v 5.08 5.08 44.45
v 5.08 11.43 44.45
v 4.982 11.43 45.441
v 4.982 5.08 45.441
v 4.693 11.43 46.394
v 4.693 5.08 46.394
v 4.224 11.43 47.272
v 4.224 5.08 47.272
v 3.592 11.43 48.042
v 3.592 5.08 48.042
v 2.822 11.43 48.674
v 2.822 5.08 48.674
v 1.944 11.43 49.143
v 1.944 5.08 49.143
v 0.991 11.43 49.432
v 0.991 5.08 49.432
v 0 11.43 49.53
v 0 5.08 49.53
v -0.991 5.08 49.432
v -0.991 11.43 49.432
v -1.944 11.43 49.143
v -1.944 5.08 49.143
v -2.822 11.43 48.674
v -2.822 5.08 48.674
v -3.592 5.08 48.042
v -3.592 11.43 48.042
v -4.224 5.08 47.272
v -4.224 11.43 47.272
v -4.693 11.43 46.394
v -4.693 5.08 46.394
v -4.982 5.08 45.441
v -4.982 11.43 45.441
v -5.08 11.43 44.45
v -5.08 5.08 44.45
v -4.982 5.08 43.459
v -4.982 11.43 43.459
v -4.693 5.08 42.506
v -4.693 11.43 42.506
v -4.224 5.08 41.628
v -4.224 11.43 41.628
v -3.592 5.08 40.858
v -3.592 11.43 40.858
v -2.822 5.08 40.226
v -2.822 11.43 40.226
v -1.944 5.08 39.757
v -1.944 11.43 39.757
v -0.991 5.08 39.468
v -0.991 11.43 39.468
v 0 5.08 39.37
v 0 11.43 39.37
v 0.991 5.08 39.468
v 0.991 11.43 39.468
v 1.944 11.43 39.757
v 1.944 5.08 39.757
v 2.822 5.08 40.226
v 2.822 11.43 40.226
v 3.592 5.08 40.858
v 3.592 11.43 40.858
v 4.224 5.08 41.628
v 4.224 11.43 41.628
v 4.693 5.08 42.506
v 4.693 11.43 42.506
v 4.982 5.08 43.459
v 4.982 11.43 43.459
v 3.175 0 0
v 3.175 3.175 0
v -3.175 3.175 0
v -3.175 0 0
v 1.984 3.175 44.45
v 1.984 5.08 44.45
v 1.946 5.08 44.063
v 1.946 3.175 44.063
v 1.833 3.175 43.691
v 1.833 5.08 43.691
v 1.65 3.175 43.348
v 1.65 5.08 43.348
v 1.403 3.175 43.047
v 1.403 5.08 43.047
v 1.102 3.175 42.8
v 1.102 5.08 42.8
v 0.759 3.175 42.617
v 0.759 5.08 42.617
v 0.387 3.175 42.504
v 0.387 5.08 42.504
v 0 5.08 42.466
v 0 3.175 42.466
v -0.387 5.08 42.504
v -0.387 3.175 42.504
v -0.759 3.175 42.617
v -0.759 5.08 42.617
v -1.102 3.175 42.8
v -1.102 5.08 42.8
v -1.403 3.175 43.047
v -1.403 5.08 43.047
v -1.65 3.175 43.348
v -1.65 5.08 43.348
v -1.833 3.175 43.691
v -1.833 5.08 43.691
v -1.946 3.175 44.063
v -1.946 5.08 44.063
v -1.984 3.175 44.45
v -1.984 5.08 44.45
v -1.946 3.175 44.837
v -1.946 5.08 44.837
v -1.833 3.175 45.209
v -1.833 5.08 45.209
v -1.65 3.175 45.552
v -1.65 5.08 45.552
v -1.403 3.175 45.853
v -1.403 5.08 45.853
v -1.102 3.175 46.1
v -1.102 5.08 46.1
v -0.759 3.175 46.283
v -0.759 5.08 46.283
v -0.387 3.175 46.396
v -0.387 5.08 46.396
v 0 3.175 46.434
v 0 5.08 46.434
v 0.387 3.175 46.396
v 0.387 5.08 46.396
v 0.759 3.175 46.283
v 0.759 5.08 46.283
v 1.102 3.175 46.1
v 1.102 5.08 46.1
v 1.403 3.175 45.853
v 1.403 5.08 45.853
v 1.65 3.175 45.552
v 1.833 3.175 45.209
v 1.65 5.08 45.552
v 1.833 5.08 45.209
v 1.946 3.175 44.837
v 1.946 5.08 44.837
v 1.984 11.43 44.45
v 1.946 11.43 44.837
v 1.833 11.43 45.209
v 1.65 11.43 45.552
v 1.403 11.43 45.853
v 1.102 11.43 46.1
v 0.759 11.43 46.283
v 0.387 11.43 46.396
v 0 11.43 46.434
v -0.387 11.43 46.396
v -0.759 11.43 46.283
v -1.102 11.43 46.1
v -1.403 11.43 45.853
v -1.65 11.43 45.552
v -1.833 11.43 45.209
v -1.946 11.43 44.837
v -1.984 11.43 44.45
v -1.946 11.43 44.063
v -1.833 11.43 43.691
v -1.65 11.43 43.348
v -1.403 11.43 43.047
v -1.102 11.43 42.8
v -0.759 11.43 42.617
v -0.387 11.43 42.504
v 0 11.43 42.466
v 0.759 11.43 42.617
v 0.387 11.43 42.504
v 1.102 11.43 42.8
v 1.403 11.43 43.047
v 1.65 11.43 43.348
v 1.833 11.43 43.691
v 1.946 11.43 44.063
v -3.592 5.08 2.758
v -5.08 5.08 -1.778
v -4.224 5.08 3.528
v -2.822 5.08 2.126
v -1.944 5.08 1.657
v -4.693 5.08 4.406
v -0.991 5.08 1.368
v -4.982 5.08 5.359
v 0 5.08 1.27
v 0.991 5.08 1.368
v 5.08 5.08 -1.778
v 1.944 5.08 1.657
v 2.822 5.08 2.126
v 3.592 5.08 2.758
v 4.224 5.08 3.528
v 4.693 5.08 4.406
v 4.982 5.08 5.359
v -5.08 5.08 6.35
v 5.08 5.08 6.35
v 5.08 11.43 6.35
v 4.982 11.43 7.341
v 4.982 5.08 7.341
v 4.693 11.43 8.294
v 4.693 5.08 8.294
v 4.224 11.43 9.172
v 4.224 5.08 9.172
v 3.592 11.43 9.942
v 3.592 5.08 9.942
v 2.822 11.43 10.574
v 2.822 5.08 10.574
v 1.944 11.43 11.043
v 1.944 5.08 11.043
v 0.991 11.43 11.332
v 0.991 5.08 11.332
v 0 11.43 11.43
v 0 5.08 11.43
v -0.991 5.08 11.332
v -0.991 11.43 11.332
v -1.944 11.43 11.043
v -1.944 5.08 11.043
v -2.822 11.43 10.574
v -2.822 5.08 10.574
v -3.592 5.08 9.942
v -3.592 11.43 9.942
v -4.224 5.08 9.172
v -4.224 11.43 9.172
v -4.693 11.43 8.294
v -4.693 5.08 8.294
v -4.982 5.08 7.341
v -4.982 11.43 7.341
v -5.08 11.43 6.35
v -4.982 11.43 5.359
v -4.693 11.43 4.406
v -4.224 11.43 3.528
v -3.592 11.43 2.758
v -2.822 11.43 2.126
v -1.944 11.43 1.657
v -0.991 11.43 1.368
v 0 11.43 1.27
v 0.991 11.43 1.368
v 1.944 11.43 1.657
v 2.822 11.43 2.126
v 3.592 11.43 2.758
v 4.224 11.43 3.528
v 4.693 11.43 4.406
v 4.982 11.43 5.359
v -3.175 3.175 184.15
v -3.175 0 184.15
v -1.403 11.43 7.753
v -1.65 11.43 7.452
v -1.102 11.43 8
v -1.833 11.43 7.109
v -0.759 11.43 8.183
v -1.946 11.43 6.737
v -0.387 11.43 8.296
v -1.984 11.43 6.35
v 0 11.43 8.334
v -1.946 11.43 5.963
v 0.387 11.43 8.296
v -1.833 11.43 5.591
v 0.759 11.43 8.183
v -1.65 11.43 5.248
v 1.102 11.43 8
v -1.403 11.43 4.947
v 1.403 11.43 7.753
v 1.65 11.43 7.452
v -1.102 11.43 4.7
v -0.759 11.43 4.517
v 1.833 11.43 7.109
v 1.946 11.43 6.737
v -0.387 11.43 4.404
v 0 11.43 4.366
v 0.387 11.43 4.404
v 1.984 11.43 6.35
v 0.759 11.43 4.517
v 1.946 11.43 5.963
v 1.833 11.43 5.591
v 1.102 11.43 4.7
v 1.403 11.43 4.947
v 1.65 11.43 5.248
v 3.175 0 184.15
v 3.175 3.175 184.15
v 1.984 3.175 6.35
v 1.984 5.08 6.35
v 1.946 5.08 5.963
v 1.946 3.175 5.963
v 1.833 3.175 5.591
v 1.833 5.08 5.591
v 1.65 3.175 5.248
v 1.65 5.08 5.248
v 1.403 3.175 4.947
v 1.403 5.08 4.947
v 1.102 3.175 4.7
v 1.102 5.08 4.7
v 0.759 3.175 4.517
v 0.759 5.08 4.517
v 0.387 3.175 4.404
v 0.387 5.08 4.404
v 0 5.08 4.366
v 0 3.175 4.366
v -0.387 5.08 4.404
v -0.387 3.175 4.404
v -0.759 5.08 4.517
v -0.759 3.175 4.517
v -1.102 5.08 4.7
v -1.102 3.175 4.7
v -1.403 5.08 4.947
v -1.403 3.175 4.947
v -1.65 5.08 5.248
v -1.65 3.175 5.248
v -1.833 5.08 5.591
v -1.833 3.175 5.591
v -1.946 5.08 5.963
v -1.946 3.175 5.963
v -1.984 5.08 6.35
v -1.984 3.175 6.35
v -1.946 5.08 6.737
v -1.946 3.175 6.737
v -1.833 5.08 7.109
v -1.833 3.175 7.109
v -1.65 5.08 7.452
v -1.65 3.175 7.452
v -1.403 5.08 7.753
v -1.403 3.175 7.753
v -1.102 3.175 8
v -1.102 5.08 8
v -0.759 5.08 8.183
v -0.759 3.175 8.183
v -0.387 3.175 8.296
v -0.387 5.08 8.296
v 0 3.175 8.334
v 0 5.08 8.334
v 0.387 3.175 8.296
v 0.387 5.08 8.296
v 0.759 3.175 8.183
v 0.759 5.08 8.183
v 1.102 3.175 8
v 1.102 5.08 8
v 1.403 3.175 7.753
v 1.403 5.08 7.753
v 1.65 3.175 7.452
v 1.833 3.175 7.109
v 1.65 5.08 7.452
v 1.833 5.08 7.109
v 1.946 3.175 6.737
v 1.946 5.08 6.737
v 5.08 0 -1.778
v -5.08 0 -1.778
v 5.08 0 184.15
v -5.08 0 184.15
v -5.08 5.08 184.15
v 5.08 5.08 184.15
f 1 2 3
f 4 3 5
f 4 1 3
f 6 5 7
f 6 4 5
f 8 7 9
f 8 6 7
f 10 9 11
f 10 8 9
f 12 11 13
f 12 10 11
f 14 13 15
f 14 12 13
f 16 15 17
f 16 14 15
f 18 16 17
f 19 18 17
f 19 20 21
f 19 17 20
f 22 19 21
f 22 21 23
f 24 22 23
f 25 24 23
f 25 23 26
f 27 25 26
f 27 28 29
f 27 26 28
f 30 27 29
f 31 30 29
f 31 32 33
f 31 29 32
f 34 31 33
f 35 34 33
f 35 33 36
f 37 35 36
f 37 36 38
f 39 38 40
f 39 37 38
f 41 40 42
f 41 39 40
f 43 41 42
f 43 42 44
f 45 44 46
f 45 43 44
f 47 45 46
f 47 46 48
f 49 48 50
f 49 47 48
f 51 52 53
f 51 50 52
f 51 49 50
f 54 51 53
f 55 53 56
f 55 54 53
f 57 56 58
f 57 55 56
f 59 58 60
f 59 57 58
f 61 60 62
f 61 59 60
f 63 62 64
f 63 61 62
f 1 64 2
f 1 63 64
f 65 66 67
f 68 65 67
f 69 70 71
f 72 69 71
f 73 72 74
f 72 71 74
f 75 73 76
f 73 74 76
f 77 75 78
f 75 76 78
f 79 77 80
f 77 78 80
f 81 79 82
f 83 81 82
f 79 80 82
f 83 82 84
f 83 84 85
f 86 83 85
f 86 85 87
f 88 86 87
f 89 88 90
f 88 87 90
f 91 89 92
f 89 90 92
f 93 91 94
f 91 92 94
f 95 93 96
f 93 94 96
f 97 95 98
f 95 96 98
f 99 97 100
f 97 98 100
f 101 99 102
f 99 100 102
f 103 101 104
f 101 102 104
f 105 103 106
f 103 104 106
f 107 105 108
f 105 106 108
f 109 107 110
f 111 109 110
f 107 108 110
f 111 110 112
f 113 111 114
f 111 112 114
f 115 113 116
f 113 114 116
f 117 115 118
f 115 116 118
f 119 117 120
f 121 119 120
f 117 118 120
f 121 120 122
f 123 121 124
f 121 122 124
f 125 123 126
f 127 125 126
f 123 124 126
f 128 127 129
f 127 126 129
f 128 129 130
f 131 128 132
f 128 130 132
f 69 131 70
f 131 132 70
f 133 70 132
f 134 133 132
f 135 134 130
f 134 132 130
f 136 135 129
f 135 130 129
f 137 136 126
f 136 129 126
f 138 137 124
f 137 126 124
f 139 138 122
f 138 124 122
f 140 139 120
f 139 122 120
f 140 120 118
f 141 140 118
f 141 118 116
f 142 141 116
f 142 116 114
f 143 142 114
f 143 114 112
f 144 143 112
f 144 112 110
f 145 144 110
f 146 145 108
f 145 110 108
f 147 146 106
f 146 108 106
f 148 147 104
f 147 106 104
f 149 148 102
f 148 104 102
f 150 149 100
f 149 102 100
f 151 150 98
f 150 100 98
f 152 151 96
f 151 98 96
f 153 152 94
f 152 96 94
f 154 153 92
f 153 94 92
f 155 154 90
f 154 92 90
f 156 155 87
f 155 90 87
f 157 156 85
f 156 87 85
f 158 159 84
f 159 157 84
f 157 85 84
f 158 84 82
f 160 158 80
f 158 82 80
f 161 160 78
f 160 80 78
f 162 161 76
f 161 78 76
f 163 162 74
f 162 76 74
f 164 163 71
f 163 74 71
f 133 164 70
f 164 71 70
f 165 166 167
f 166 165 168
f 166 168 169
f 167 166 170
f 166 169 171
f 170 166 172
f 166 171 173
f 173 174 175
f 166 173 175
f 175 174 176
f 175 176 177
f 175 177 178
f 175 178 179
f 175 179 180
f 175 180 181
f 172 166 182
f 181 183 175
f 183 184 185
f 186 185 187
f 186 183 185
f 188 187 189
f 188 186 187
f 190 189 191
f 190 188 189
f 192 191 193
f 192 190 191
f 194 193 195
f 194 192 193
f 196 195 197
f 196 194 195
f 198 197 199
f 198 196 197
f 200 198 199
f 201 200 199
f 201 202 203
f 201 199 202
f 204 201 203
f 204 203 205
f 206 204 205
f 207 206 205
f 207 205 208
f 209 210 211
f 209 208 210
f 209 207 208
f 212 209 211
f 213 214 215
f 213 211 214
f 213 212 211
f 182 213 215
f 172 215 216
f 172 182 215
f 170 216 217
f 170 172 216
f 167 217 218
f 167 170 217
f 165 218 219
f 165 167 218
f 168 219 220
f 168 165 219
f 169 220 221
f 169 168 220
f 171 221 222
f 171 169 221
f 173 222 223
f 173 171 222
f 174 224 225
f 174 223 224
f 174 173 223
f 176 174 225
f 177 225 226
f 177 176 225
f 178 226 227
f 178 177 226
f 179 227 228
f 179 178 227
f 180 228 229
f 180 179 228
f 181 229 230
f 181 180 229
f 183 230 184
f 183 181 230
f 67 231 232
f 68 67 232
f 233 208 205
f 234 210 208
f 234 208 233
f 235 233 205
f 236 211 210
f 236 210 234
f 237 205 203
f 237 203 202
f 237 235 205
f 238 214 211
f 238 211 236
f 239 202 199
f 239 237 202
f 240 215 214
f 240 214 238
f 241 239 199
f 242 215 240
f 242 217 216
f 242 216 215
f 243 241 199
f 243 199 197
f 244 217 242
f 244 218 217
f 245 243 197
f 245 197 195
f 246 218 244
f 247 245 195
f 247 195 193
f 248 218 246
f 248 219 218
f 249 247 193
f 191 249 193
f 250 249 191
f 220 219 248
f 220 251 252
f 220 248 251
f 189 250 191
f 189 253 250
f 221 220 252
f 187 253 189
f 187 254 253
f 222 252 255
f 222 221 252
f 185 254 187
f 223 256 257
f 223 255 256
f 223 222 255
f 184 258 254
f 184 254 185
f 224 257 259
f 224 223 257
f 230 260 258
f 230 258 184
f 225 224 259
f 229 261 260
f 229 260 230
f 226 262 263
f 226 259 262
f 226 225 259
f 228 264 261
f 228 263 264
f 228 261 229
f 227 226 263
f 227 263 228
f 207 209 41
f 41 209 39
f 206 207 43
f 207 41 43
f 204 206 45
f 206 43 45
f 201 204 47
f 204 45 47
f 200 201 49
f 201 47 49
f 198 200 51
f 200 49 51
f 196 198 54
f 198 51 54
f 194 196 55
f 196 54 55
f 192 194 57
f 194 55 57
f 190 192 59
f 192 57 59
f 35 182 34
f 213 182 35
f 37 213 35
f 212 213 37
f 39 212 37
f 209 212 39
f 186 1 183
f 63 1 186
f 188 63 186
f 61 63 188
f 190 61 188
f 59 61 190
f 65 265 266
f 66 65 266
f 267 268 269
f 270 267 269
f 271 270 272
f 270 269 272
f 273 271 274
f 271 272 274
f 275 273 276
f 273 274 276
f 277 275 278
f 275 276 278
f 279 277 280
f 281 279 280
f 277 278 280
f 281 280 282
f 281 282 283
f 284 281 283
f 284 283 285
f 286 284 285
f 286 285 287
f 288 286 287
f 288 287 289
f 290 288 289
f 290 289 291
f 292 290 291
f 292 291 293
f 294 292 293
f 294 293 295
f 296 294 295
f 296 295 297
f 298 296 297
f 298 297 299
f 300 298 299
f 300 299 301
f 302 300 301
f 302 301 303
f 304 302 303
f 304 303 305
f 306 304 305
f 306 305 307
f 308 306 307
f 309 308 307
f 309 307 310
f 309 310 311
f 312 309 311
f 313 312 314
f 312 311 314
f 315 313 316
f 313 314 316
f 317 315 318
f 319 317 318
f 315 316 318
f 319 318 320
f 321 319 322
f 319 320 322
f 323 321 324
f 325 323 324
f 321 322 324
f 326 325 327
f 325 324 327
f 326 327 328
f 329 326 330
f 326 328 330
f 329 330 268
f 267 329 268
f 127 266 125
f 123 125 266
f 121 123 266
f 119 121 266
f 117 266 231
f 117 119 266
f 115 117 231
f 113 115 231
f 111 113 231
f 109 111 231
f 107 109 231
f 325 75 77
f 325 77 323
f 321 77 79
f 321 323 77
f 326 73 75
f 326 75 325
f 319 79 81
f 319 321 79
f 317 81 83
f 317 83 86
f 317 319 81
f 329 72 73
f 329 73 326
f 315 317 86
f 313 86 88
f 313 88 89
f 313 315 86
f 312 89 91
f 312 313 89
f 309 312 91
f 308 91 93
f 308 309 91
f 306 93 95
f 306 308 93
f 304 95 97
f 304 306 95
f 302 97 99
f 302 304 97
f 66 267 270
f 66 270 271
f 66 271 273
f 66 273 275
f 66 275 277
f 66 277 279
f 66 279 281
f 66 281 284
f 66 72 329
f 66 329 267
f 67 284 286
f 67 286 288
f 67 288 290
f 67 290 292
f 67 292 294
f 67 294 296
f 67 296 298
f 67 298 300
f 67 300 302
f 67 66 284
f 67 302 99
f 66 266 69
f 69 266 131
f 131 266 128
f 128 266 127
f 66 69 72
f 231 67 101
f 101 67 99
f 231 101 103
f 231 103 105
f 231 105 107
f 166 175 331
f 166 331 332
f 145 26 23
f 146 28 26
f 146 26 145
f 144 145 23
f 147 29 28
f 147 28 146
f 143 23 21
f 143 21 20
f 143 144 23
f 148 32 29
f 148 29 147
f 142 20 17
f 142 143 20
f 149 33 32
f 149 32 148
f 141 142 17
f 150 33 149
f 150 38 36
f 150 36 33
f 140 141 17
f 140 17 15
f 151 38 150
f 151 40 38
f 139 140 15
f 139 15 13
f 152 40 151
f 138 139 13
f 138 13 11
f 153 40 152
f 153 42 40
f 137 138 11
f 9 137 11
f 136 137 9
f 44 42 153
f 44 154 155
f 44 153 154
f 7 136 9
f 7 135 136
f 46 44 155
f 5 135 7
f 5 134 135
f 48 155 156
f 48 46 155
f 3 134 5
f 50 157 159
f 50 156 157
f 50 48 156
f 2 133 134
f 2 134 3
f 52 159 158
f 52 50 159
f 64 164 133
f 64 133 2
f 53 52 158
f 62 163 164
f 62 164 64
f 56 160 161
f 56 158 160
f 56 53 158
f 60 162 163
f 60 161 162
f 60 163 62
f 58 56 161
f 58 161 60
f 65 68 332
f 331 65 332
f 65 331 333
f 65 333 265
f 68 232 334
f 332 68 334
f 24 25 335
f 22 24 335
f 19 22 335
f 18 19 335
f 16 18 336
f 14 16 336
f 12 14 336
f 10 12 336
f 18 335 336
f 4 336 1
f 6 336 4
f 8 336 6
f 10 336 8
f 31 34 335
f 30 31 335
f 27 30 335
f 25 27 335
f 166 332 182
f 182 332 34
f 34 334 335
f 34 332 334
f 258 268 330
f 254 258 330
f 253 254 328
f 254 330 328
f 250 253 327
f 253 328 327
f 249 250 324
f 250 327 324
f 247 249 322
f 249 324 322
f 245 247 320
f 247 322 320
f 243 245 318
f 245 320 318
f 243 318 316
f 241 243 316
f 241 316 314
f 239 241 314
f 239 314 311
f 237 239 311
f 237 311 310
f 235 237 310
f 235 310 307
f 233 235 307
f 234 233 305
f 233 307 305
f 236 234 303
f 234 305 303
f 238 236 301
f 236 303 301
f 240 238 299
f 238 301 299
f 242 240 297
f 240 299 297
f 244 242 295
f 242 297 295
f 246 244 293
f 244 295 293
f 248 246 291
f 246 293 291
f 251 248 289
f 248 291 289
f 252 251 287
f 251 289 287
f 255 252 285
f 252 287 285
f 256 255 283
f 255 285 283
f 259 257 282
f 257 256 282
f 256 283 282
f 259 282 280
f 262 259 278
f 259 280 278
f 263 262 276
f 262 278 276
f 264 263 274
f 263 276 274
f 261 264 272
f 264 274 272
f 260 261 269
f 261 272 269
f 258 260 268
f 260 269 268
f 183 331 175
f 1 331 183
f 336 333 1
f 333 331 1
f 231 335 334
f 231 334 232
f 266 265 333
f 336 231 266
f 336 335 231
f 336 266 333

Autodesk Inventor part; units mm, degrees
ref_plane "YZ Plane" through (0, 0, 0) normal (1, 0, 0) x (0, 1, 0)
ref_plane "XZ Plane" through (0, 0, 0) normal (0, 1, 0) x (-1, 0, 0)
ref_plane "XY Plane" through (0, 0, 0) normal (0, 0, 1) x (1, 0, 0)
sketch "Sketch1" plane through (0, 0, 0) normal (0, 0, 1) x (1, 0, 0)
  line L0 (3.175, 0) -> (3.175, 3.175)
  line L1 (3.175, 3.175) -> (-3.175, 3.175)
  line L2 (-3.175, 3.175) -> (-3.175, 0)
  line L3 (-5.08, 0) -> (-5.08, 5.08)
  line L4 (-5.08, 5.08) -> (5.08, 5.08)
  line L5 (5.08, 5.08) -> (5.08, 0)
  line L6 (5.08, 0) -> (3.175, 0)
  line L7 (-3.175, 0) -> (-5.08, 0)
  point P0 (0, 0)
  dimension "d0" = 10.16
  dimension "d1" = 5.08
extrude "Extrusion1" add sketch "Sketch1" along normal blind 368.3
sketch "Sketch2" plane through (-5.08, 5.08, 0) normal (0, 1, 0) x (1, 0, 0)
  circle A0 centre (5.08, -6.35) radius 1.9844
  circle A1 centre (5.08, -44.45) radius 1.9844
  circle A2 centre (5.08, -361.95) radius 1.9844
  circle A3 centre (5.08, -323.85) radius 1.9844
  point P0 (5.08, 0)
  dimension "d4" = 3.9688
  dimension "d5" = 3.9688
  dimension "d6" = 3.9688
  dimension "d7" = 3.9688
extrude "Extrusion2" cut sketch "Sketch2" against normal blind 368.3
sketch "Sketch3" plane through (0, 0, 0) normal (0, 0, -1) x (-1, 0, 0)
  line L0 (-5.08, 0) -> (-5.08, 5.08) projected
  line L1 (5.08, 5.08) -> (-5.08, 5.08)
  line L2 (-5.08, 5.08) -> (-5.08, 0)
  line L3 (-5.08, 0) -> (5.08, 0)
  line L4 (5.08, 0) -> (5.08, 5.08)
  point P0 (0, 0)
sketch "Sketch4" plane through (0, 0, 0) normal (0, 0, -1) x (-1, 0, 0)
  point P0 (0, 0)
extrude "Extrusion3" add sketch "Sketch3" along normal blind 1.778
sketch "Sketch5" plane through (-5.08, 5.08, 368.3) normal (0, 1, 0) x (1, 0, 0)
  circle A0 centre (5.08, 6.35) radius 1.9844 projected
  circle A1 centre (5.08, 44.45) radius 1.9844 projected
  circle A2 centre (5.08, 323.85) radius 1.9844 projected
  circle A3 centre (5.08, 361.95) radius 1.9844 projected
  circle A4 centre (5.08, 6.35) radius 5.08
  line L0 (10.16, 0) -> (10.16, 370.078) projected
  circle A5 centre (5.08, 44.45) radius 5.08
  circle A6 centre (5.08, 323.85) radius 5.08
  circle A7 centre (5.08, 361.95) radius 5.08
  point P0 (5.08, 368.3)
extrude "Extrusion4" add sketch "Sketch5" along normal blind 6.35
sketch "Sketch6" plane through (0, 0, 368.3) normal (0, 0, 1) x (1, 0, 0)
  line L0 (-15.875, -1.5875) -> (12.7, -1.5875)
  line L1 (12.7, -1.5875) -> (12.7, 14.2875)
  line L2 (12.7, 14.2875) -> (-15.875, 14.2875)
  line L3 (-15.875, 14.2875) -> (-15.875, -1.5875)
  point P0 (0, 0)
extrude "Extrusion5" cut sketch "Sketch6" against normal blind 184.15
properties part number "hs_intake_cb_jig_second"
